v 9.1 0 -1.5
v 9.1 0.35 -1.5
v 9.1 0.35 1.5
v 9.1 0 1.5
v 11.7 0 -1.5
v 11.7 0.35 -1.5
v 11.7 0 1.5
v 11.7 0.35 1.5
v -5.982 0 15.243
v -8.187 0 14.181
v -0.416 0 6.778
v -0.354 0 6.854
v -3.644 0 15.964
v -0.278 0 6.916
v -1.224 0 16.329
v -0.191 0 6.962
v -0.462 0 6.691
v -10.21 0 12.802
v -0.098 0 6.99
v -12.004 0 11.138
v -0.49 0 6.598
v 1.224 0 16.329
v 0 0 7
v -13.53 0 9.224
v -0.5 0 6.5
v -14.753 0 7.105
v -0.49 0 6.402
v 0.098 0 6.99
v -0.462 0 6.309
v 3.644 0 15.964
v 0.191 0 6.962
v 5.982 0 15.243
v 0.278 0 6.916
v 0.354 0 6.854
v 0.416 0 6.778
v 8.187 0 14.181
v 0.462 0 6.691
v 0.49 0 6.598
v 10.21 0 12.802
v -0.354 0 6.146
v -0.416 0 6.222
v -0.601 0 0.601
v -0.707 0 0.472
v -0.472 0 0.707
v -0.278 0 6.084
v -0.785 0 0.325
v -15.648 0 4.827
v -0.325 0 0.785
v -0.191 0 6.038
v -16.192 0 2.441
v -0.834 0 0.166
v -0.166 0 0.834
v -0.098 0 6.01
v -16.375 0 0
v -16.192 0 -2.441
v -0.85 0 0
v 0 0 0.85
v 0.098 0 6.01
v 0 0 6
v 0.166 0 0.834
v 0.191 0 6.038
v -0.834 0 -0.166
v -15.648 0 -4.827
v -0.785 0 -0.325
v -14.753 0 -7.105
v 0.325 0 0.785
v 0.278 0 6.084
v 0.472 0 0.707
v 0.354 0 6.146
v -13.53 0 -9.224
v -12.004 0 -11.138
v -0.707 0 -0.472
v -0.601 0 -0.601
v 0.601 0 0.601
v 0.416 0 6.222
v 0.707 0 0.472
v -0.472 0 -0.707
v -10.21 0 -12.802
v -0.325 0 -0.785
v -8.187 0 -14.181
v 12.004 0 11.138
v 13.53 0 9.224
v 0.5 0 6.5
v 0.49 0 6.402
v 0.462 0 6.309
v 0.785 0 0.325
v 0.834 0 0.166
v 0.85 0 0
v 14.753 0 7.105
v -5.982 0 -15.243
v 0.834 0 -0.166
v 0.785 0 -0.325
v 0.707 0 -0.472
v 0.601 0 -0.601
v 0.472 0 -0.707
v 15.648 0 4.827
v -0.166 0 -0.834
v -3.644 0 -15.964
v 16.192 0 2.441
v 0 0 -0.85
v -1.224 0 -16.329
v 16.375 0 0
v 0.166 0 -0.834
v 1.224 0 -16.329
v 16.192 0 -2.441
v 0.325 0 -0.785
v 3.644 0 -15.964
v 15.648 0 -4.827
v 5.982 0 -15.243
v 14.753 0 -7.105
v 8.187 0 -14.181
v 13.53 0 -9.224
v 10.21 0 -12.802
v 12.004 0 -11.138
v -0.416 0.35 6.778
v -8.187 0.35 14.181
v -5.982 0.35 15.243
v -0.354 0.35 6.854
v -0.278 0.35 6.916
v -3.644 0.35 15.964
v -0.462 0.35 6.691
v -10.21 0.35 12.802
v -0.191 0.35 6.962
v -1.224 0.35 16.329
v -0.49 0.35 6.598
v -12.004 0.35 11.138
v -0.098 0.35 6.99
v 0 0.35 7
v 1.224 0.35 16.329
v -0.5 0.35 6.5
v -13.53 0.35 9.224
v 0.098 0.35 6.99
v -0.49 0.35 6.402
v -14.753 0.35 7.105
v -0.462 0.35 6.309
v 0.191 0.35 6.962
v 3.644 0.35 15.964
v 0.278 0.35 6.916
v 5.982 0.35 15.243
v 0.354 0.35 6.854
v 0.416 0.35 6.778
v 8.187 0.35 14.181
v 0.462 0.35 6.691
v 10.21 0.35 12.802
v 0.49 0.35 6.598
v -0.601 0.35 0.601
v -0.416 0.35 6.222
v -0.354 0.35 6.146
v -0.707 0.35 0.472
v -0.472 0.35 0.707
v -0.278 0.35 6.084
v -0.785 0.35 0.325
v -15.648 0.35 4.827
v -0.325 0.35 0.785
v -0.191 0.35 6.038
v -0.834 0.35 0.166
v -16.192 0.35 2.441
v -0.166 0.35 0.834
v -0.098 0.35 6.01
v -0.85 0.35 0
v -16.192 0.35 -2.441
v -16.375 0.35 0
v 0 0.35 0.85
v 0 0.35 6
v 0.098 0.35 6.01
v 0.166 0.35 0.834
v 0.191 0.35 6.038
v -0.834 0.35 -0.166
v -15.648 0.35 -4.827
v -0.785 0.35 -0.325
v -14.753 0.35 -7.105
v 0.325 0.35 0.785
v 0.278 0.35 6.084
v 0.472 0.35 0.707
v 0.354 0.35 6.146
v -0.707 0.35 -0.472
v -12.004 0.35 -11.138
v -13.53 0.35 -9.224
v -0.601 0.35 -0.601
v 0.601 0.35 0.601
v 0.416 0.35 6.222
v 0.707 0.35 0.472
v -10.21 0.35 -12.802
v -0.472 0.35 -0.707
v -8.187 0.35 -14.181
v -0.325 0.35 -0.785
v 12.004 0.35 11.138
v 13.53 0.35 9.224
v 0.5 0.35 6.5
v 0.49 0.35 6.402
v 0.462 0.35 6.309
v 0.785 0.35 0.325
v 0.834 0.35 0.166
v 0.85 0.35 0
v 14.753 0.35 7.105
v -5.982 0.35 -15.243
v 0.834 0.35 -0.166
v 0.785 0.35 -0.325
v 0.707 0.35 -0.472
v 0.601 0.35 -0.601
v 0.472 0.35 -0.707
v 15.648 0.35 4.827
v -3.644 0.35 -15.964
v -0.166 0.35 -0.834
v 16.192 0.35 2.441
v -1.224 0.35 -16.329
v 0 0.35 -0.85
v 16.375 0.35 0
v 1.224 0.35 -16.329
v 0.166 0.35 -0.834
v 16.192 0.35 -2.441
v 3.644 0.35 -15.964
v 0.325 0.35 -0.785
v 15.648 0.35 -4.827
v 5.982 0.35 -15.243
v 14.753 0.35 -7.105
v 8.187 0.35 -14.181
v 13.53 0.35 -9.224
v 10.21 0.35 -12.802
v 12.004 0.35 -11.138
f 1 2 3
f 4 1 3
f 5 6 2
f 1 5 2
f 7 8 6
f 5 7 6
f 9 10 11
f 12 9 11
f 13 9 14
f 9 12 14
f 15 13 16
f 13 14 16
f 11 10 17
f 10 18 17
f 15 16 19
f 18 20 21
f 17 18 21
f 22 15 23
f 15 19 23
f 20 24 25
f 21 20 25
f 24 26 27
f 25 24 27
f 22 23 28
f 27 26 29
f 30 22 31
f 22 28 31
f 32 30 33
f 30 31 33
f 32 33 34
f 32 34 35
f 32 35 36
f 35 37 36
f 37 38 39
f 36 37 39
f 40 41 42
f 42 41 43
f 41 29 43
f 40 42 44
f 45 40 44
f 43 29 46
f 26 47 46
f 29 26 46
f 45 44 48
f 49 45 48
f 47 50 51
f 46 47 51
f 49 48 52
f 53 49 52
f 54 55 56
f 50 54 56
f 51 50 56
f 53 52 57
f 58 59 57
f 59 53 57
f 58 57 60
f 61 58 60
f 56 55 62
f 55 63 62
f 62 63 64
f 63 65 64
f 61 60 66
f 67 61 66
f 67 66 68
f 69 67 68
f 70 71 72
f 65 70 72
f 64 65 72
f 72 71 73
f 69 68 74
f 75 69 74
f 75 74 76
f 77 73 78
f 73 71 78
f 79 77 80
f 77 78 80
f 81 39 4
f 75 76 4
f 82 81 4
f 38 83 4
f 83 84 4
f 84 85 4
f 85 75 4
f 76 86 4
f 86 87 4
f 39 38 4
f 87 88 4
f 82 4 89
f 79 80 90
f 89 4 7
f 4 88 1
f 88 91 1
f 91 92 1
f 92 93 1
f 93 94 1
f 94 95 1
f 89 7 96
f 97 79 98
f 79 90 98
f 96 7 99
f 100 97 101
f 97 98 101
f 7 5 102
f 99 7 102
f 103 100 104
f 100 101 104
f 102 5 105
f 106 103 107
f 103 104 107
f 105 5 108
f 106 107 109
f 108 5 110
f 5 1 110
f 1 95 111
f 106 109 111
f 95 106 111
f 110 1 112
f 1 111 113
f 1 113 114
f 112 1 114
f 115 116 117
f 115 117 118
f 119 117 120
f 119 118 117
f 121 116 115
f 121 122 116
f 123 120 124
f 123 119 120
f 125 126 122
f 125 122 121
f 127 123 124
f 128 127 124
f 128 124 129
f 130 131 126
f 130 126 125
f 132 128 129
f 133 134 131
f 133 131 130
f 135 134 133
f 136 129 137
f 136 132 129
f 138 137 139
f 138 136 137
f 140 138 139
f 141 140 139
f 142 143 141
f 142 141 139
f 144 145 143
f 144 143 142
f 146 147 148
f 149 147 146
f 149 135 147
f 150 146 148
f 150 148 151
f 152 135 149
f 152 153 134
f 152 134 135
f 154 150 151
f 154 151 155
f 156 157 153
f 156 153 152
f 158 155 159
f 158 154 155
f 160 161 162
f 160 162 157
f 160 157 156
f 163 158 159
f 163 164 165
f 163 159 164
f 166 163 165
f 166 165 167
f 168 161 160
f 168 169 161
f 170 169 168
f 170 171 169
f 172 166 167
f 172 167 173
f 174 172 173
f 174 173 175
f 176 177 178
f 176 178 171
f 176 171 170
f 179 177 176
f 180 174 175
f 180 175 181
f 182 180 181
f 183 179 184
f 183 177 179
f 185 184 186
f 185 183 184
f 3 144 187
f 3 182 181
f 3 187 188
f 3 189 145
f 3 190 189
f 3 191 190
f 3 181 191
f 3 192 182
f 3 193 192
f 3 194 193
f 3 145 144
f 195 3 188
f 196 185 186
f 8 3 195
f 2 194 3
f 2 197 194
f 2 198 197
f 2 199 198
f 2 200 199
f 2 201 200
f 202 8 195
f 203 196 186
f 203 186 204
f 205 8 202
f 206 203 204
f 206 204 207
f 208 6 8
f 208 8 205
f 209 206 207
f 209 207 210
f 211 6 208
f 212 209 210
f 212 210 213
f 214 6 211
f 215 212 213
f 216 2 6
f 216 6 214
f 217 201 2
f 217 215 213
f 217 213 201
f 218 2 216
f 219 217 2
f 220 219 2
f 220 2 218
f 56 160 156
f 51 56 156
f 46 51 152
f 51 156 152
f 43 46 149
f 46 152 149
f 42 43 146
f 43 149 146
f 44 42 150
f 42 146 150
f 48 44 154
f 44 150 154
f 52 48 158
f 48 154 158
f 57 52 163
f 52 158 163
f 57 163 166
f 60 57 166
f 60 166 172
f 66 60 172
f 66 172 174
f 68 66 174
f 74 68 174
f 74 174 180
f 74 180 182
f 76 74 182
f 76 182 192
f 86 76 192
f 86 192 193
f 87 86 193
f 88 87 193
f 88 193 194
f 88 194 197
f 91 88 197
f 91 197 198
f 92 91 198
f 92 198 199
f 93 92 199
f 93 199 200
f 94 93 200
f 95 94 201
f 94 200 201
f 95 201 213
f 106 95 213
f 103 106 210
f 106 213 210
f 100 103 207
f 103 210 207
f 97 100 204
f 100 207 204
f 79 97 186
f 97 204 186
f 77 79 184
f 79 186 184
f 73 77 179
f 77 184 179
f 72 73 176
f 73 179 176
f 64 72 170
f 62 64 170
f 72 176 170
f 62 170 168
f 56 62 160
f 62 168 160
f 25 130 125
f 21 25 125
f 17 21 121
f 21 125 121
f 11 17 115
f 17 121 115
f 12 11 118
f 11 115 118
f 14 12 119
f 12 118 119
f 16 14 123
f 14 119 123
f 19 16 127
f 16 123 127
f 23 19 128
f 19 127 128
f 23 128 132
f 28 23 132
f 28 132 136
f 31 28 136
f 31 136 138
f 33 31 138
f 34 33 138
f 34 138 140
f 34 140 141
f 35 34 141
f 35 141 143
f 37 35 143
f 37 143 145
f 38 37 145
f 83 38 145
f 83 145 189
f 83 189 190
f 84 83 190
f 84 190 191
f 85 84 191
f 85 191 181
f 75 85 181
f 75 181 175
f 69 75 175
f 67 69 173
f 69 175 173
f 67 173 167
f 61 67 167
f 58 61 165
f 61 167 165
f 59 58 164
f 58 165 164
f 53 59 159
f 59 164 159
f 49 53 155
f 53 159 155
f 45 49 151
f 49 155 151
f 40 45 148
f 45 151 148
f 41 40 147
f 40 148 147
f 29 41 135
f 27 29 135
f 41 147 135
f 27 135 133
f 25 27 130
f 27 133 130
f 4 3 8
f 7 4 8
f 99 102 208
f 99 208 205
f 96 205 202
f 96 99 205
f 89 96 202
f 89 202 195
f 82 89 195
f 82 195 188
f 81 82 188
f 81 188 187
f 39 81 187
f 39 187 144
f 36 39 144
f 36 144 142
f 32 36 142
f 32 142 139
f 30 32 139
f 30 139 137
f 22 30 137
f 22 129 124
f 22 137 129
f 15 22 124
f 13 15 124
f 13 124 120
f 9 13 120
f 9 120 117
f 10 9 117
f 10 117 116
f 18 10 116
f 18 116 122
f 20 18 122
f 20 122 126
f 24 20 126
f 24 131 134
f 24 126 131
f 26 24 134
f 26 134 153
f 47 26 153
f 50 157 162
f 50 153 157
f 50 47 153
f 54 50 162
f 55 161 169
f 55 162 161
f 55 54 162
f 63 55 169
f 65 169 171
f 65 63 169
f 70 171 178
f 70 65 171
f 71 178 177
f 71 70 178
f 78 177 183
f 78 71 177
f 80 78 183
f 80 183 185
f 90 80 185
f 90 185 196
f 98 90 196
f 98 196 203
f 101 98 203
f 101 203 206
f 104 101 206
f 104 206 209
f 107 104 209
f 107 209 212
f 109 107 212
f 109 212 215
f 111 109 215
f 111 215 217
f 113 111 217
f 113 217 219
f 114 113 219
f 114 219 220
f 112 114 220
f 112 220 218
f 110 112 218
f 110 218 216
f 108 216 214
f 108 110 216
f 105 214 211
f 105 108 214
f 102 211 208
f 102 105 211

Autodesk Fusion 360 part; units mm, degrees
sketch "Sketch1" plane through (0, 0, 0) normal (0, 1, 0) x (1, 0, 0)
  circle A0 centre (0, 0) radius 16.375
  dimension "d1" = 32.75
extrude "Extrude1" add sketch "Sketch1" along normal blind 0.35
sketch "Sketch3" plane through (0, 0.35, 0) normal (0, 1, 0) x (-1, 0, 0)
  circle A0 centre (0, 0) radius 16.375
  circle A1 centre (0, 0) radius 0.85
  line L0 (-9.1, 1.5) -> (-11.7, 1.5)
  line L1 (-11.7, 1.5) -> (-11.7, -1.5)
  line L2 (-11.7, -1.5) -> (-9.1, -1.5)
  line L3 (-9.1, -1.5) -> (-9.1, 1.5)
  circle A2 centre (0, 6.5) radius 0.5
  dimension "d4" = 1.7
  dimension "d5" = 2.6
  dimension "d6" = 3
  dimension "d7" = 1.5
  dimension "d8" = 9.1
  dimension "d9" = 1
  dimension "d10" = 6.5
extrude "Extrude2" cut sketch "Sketch3" against normal through all contours A1 | L0 L1 L2 L3 | A2
sketch "Sketch4" plane through (0, 0.35, 0) normal (0, 1, 0) x (-1, 0, 0)
  line L0 (-9.1, -1.5) -> (-11.7, -1.5)
  line L1 (-11.7, -1.5) -> (-11.7, 1.5)
  line L2 (-11.7, 1.5) -> (-9.1, 1.5)
  line L3 (-9.1, 1.5) -> (-9.1, -1.5)
  circle A0 centre (0, 0) radius 0.85
  circle A1 centre (0, 6.5) radius 0.5
  circle A2 centre (0, 0) radius 16.375
  line L4 (0.375, 12.5) -> (-0.375, 12.5)
  line L5 (-0.375, 12.5) -> (-0.375, 14.5)
  line L6 (-0.375, 14.5) -> (0.375, 14.5)
  line L7 (0.375, 14.5) -> (0.375, 12.5)
  line L8 (-6.5748, 10.6378) -> (-7.5748, 12.3699)
  line L9 (-6.9252, 12.7449) -> (-5.9252, 11.0128)
  line L10 (-5.9252, 11.0128) -> (-6.5748, 10.6378)
  line L11 (-7.5748, 12.3699) -> (-6.9252, 12.7449)
  line L12 (-11.0128, 5.9252) -> (-12.7449, 6.9252)
  line L13 (-12.3699, 7.5748) -> (-10.6378, 6.5748)
  line L14 (-10.6378, 6.5748) -> (-11.0128, 5.9252)
  line L15 (-12.7449, 6.9252) -> (-12.3699, 7.5748)
  line L16 (-12.5, -0.375) -> (-14.5, -0.375)
  line L17 (-14.5, 0.375) -> (-12.5, 0.375)
  line L18 (-12.5, 0.375) -> (-12.5, -0.375)
  line L19 (-14.5, -0.375) -> (-14.5, 0.375)
  line L20 (-10.6378, -6.5748) -> (-12.3699, -7.5748)
  line L21 (-12.7449, -6.9252) -> (-11.0128, -5.9252)
  line L22 (-11.0128, -5.9252) -> (-10.6378, -6.5748)
  line L23 (-12.3699, -7.5748) -> (-12.7449, -6.9252)
  line L24 (-5.9252, -11.0128) -> (-6.9252, -12.7449)
  line L25 (-7.5748, -12.3699) -> (-6.5748, -10.6378)
  line L26 (-6.5748, -10.6378) -> (-5.9252, -11.0128)
  line L27 (-6.9252, -12.7449) -> (-7.5748, -12.3699)
  line L28 (6.5748, -10.6378) -> (7.5748, -12.3699)
  line L29 (6.9252, -12.7449) -> (5.9252, -11.0128)
  line L30 (5.9252, -11.0128) -> (6.5748, -10.6378)
  line L31 (7.5748, -12.3699) -> (6.9252, -12.7449)
  line L32 (11.0128, -5.9252) -> (12.7449, -6.9252)
  line L33 (12.3699, -7.5748) -> (10.6378, -6.5748)
  line L34 (10.6378, -6.5748) -> (11.0128, -5.9252)
  line L35 (12.7449, -6.9252) -> (12.3699, -7.5748)
  line L36 (12.5, 0.375) -> (14.5, 0.375)
  line L37 (14.5, -0.375) -> (12.5, -0.375)
  line L38 (12.5, -0.375) -> (12.5, 0.375)
  line L39 (14.5, 0.375) -> (14.5, -0.375)
  line L40 (10.6378, 6.5748) -> (12.3699, 7.5748)
  line L41 (12.7449, 6.9252) -> (11.0128, 5.9252)
  line L42 (11.0128, 5.9252) -> (10.6378, 6.5748)
  line L43 (12.3699, 7.5748) -> (12.7449, 6.9252)
  line L44 (5.9252, 11.0128) -> (6.9252, 12.7449)
  line L45 (7.5748, 12.3699) -> (6.5748, 10.6378)
  line L46 (6.5748, 10.6378) -> (5.9252, 11.0128)
  line L47 (6.9252, 12.7449) -> (7.5748, 12.3699)
  line L48 (0.75, -14.5) -> (-0.75, -14.5)
  line L49 (-0.75, -14.5) -> (0, -11.75)
  line L50 (0, -11.75) -> (0.75, -14.5)
  line L51 (0, -14.5) -> (0, -11.75)
  line L52 (-5, 6.5) -> (-4, 6.5)
  line L53 (-4.3301, 4) -> (-3.4641, 4.5)
  line L54 (-2.5, 2.1699) -> (-2, 3.0359)
  line L55 (0, 1.5) -> (0, 2.5)
  line L56 (2.5, 2.1699) -> (2, 3.0359)
  line L57 (4.3301, 4) -> (3.4641, 4.5)
  line L58 (5, 6.5) -> (4, 6.5)
  line L59 (4.3301, 9) -> (3.4641, 8.5)
  line L60 (2.5, 10.8301) -> (2, 9.9641)
  line L61 (0, 11.5) -> (0, 10.5)
  line L62 (-2.5, 10.8301) -> (-2, 9.9641)
  line L63 (-4.3301, 9) -> (-3.4641, 8.5)
  dimension "d12" = 0.75
  dimension "d13" = 2
  dimension "d14" = 14.5
  dimension "d15" = 0.375
  dimension "d17" = 360
  dimension "d18" = 2.75
  dimension "d19" = 1.5
  dimension "d20" = 14.5
  dimension "d21" = 0.75
  dimension "d24" = 5
  dimension "d25" = 1
  dimension "d27" = 360
sketch "Sketch5" plane through (0, 0.35, 0) normal (0, 1, 0) x (-1, 0, 0)
  line L0 (6.985, -3.5778) -> (-7.6268, -3.5778) construction
  line L1 (-7.6268, -3.5778) -> (-7.6268, -6.5778) construction
  line L2 (-7.6268, -6.5778) -> (6.985, -6.5778) construction
  line L3 (6.985, -6.5778) -> (6.985, -3.5778) construction
  line L4 (0.4767, -9.049) -> (-0.7965, -9.049) construction
  line L5 (-0.7965, -9.049) -> (-0.7965, -11.549) construction
  line L6 (-0.7965, -11.549) -> (0.4767, -11.549) construction
  line L7 (0.4767, -11.549) -> (0.4767, -9.049) construction
  line L8 (-5.4546, -8.2) -> (-5.7, -8.2) construction
  line L9 (-5.7, -8.2) -> (-5.7, -10.7) construction
  line L10 (-5.7, -10.7) -> (-5.4546, -10.7) construction
  line L11 (-5.4546, -10.7) -> (-5.4546, -8.2) construction
  line L12 (-9.0419, -4.874) -> (-9.8, -4.874) construction
  line L13 (-9.8, -4.874) -> (-9.8, -7.374) construction
  line L14 (-9.8, -7.374) -> (-9.0419, -7.374) construction
  line L15 (-9.0419, -7.374) -> (-9.0419, -4.874) construction
  line L16 (-9.1553, 6.5) -> (-10, 6.5) construction
  line L17 (-10, 6.5) -> (-10, 4) construction
  line L18 (-10, 4) -> (-9.1553, 4) construction
  line L19 (-9.1553, 4) -> (-9.1553, 6.5) construction
  line L20 (-5.2603, 10) -> (-6, 10) construction
  line L21 (-6, 10) -> (-6, 7.5) construction
  line L22 (-6, 7.5) -> (-5.2603, 7.5) construction
  line L23 (-5.2603, 7.5) -> (-5.2603, 10) construction
  line L24 (5.6618, -8.1907) -> (4.9086, -8.1907) construction
  line L25 (4.9086, -8.1907) -> (4.9086, -10.6907) construction
  line L26 (4.9086, -10.6907) -> (5.6618, -10.6907) construction
  line L27 (5.6618, -10.6907) -> (5.6618, -8.1907) construction
  line L28 (5.7568, 10.0139) -> (5, 10.0139) construction
  line L29 (5, 10.0139) -> (5, 7.5139) construction
  line L30 (5, 7.5139) -> (5.7568, 7.5139) construction
  line L31 (5.7568, 7.5139) -> (5.7568, 10.0139) construction
  line L32 (9.7568, 6.5) -> (8.9817, 6.5) construction
  line L33 (8.9817, 6.5) -> (8.9817, 4) construction
  line L34 (8.9817, 4) -> (9.7568, 4) construction
  line L35 (9.7568, 4) -> (9.7568, 6.5) construction
  line L36 (11.2571, 0.9949) -> (10.5002, 0.9949) construction
  line L37 (10.5002, 0.9949) -> (10.5002, -1.5051) construction
  line L38 (10.5002, -1.5051) -> (11.2571, -1.5051) construction
  line L39 (11.2571, -1.5051) -> (11.2571, 0.9949) construction
  line L40 (9.7568, -4.9) -> (8.4141, -4.9) construction
  line L41 (8.4141, -4.9) -> (8.4141, -7.4) construction
  line L42 (8.4141, -7.4) -> (9.7568, -7.4) construction
  line L43 (9.7568, -7.4) -> (9.7568, -4.9) construction
